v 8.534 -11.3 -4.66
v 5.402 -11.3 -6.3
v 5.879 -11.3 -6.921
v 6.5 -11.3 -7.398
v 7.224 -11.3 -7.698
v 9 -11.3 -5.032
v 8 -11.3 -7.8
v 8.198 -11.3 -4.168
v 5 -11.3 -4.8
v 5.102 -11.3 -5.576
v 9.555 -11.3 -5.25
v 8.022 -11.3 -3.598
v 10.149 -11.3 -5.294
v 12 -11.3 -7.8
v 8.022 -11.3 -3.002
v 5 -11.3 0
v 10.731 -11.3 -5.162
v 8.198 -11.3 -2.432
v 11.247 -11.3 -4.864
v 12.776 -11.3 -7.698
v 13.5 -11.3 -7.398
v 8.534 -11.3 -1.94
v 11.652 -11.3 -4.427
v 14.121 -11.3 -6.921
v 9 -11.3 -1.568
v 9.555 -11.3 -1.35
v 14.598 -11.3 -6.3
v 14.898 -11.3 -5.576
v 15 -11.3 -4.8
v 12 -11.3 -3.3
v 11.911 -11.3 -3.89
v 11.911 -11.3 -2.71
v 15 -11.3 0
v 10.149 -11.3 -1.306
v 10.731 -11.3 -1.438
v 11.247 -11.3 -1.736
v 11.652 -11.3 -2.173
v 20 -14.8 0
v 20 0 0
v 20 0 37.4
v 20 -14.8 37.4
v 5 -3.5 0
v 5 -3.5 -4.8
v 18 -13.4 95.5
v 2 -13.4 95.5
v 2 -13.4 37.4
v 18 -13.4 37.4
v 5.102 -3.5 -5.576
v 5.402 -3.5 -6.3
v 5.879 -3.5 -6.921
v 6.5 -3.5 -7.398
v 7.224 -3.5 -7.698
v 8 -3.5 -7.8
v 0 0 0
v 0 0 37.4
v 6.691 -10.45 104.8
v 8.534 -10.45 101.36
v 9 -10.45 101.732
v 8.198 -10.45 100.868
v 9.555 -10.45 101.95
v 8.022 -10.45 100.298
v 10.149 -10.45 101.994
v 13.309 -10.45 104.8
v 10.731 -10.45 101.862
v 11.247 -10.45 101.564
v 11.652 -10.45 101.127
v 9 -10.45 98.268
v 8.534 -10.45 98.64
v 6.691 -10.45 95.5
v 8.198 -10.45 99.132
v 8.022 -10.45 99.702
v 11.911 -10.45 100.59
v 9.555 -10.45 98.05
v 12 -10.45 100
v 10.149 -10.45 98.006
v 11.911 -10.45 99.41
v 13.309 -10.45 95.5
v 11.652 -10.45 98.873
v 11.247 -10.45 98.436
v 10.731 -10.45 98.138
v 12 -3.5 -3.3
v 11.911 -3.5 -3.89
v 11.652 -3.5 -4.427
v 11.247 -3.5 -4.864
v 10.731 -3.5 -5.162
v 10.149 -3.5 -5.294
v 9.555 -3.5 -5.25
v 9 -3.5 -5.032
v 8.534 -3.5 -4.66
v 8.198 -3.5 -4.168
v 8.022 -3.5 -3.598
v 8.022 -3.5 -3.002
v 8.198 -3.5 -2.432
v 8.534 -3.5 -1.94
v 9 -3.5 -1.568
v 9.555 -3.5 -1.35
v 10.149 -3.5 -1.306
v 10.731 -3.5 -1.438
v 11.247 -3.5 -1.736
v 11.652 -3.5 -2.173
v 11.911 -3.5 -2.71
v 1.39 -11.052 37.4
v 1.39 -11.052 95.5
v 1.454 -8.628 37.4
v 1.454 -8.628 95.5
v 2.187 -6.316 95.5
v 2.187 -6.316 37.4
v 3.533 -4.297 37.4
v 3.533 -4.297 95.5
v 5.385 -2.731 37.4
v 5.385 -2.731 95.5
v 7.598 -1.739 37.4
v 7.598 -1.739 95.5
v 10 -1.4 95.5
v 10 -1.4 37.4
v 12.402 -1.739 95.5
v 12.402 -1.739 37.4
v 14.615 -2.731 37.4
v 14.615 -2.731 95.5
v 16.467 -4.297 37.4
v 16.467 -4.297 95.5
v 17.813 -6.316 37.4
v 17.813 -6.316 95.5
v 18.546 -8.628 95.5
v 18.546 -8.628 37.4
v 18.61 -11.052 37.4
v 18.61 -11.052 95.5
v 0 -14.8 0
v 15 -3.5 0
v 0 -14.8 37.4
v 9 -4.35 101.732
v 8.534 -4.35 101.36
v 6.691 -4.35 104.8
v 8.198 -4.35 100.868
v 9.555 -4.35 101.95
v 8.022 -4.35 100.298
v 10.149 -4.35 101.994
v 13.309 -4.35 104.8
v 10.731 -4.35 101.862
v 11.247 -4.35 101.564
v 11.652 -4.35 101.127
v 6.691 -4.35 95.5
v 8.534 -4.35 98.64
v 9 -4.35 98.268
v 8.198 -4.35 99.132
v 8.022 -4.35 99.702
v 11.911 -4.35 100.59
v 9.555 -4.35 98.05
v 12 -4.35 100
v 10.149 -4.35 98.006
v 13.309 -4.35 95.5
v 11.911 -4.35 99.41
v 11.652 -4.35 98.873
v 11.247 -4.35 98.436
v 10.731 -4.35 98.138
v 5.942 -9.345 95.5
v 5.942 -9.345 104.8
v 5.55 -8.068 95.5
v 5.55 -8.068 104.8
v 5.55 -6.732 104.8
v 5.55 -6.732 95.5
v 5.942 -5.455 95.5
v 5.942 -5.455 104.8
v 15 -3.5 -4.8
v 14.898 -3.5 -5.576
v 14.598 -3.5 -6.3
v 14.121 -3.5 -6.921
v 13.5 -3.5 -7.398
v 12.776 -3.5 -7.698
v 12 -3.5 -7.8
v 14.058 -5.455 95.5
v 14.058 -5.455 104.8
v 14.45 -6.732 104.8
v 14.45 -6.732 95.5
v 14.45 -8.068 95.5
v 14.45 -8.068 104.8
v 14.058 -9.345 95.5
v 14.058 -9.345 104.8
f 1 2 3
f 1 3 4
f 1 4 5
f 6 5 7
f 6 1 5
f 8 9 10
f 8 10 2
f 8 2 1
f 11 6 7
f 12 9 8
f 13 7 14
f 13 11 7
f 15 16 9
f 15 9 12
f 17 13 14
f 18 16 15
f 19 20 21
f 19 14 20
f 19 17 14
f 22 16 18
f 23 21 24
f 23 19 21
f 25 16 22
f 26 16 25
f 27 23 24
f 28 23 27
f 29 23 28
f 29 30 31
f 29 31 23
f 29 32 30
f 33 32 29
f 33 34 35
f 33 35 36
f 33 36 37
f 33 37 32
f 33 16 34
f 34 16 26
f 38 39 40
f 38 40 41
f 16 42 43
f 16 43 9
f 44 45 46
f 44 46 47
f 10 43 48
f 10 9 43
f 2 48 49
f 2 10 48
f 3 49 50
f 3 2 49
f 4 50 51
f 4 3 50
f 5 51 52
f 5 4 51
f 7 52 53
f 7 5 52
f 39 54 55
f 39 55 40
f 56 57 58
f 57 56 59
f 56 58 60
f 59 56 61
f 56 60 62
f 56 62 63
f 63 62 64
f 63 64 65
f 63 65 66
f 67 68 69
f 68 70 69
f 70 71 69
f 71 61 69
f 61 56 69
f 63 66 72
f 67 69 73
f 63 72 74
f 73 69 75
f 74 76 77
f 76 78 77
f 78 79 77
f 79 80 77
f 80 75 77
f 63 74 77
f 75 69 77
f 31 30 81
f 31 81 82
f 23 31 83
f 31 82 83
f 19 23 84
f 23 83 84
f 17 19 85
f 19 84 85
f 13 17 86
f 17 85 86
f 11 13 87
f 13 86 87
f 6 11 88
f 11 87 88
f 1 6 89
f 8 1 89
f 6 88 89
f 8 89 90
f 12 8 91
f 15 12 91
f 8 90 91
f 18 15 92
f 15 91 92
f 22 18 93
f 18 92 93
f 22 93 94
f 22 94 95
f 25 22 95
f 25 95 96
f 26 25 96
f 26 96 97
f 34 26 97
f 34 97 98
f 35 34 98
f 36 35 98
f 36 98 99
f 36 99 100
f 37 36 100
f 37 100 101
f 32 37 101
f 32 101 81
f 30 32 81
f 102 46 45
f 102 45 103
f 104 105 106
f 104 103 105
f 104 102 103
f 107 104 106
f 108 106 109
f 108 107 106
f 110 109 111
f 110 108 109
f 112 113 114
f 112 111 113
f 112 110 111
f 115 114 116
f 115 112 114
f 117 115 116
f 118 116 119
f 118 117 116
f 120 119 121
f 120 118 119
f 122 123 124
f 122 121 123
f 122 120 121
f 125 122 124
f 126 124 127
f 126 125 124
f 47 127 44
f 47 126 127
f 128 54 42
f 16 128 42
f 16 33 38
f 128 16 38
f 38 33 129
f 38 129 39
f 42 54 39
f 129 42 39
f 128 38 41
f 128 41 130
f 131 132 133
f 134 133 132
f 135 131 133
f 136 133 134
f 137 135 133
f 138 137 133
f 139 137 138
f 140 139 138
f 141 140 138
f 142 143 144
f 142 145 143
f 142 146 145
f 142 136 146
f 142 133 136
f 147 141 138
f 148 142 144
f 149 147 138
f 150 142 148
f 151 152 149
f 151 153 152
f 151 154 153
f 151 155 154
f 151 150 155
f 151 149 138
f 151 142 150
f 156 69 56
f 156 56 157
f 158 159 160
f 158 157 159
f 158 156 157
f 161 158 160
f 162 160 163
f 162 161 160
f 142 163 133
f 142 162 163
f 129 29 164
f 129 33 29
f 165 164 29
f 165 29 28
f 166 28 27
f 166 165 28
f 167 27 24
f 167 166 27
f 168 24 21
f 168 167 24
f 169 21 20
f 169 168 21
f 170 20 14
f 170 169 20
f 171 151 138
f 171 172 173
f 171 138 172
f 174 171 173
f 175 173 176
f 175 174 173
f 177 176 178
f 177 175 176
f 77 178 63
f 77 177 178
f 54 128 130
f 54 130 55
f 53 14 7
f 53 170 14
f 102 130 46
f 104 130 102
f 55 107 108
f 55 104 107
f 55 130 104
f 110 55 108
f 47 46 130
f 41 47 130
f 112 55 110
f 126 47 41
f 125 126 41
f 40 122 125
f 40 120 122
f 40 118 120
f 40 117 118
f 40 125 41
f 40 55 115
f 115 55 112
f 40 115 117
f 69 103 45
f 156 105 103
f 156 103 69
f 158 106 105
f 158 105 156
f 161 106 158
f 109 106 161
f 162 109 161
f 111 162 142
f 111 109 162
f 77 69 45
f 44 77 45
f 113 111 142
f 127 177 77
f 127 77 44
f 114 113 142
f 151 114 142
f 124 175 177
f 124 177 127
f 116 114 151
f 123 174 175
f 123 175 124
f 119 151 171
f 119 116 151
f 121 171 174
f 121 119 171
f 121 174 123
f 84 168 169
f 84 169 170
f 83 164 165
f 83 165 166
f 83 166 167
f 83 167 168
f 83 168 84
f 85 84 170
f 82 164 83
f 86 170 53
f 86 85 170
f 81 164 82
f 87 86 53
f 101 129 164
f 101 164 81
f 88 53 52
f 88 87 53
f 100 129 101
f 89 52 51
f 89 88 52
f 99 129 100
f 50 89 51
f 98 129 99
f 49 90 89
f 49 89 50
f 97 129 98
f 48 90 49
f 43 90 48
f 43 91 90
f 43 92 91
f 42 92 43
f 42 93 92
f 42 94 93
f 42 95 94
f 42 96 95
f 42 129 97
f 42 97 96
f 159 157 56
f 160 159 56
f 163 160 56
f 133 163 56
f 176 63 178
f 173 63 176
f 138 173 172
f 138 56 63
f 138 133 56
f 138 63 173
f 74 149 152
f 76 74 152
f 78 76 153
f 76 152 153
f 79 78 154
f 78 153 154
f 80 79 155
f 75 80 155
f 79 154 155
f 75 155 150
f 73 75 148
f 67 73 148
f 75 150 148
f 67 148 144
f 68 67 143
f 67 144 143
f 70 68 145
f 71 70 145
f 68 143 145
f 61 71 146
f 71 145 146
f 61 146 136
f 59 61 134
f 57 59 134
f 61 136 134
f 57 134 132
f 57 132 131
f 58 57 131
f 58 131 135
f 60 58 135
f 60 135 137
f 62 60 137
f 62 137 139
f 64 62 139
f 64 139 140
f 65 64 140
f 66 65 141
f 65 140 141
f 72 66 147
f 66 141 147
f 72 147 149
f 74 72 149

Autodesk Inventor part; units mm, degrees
ref_plane "YZ Plane" through (0, 0, 0) normal (1, 0, 0) x (0, 1, 0)
ref_plane "XZ Plane" through (0, 0, 0) normal (0, 1, 0) x (-1, 0, 0)
ref_plane "XY Plane" through (0, 0, 0) normal (0, 0, 1) x (1, 0, 0)
sketch "Sketch1" plane through (0, 0, 0) normal (0, 0, 1) x (1, 0, 0)
  line L0 (0, 0) -> (20, 0)
  line L1 (20, 0) -> (20, -14.8)
  line L2 (20, -14.8) -> (0, -14.8)
  line L3 (0, -14.8) -> (0, 0)
  dimension "d0" = 20
  dimension "d1" = 14.8
extrude "Extrusion1" add sketch "Sketch1" along normal blind 37.4
sketch "Sketch2" plane through (0, 0, 37.4) normal (0, 0, 1) x (1, 0, 0)
  line L0 (0, 0) -> (0, -14.8) projected
  line L1 (20, 0) -> (0, 0) projected
  line L2 (2, -13.4) -> (18, -13.4)
  arc A0 (18, -13.4) -> (2, -13.4) centre (10, -10.0667) ccw
  point P0 (10, -7.4)
  point P1 (10, -13.4)
extrude "Extrusion2" add sketch "Sketch2" along normal blind 58.1
sketch "Sketch3" plane through (0, 0, 95.5) normal (0, 0, 1) x (1, 0, 0)
  arc A0 (18, -13.4) -> (2, -13.4) centre (10, -10.0667) ccw projected
  line L0 (2, -13.4) -> (18, -13.4) projected
  line L1 (2, -13.4) -> (2, -13.4)
  line L2 (2, -13.4) -> (2, -13.4) construction
  line L3 (10, -13.4) -> (22, -13.4) construction
  line L4 (18, -13.4) -> (2, -13.4) projected
  line L5 (0, -14.8) -> (20, -14.8) projected
  line L6 (6.6913, -4.35) -> (13.3087, -4.35)
  line L7 (6.6913, -10.45) -> (13.3087, -10.45)
  arc A1 (6.6913, -4.35) -> (6.6913, -10.45) centre (10, -7.4) ccw
  arc A2 (13.3087, -10.45) -> (13.3087, -4.35) centre (10, -7.4) ccw
  point P0 (0, 0)
  dimension "d12" = 90
extrude "Extrusion3" add sketch "Sketch3" along normal blind 9.3 contours L6 A2 L7 A1
sketch "Sketch4" plane through (6.6913, -4.35, 95.5) normal (0, 1, 0) x (1, 0, 0)
  circle A0 centre (3.3087, -4.5) radius 2
  line L0 (-5.358, 0) -> (11.9754, 0) projected
  point P0 (-6.6913, 95.5)
  point P1 (11.3087, 0)
  point P2 (-4.6913, 0)
  dimension "d21" = 4
  dimension "d22" = 4.5
extrude "Extrusion4" cut sketch "Sketch4" against normal through all
sketch "Sketch5" plane through (0, 0, 0) normal (0, 0, -1) x (-1, 0, 0)
  line L0 (-15, -3.5) -> (-5, -3.5)
  line L1 (-5, -3.5) -> (-5, -11.3)
  line L2 (-5, -11.3) -> (-15, -11.3)
  line L3 (-15, -11.3) -> (-15, -3.5)
  line L4 (-15, -3.5) -> (-5, -11.3) construction
  line L5 (-5, -3.5) -> (-15, -11.3) construction
  line L6 (-20, 0) -> (0, 0) projected
  line L7 (0, -14.8) -> (-20, -14.8) projected
  line L8 (0, 0) -> (0, -14.8) projected
  line L9 (-20, 0) -> (0, 0) projected
  line L10 (-20, -14.8) -> (-20, 0) projected
  point P0 (-10, -7.4)
  point P1 (0, -7.4)
  point P2 (-10, -7.4)
  dimension "d25" = 7.8
  dimension "d26" = 10
  dimension "d27" = 10
extrude "Extrusion5" add sketch "Sketch5" along normal blind 7.8 contours L0 L1 L2 L3
sketch "Sketch6" plane through (5, -3.5, 0) normal (0, 1, 0) x (1, 0, 0)
  circle A0 centre (5, 3.3) radius 2
  line L0 (0, 7.8) -> (10, 7.8) projected
  line L1 (0, 0) -> (0, 7.8) projected
  point P0 (-5, 0)
  point P1 (5, 7.8)
  dimension "d30" = 4
  dimension "d31" = 4.5
  dimension "d32" = 5
extrude "Extrusion6" cut sketch "Sketch6" against normal through all
fillet "Fillet1" radius 3 2 edges at (15, -7.4, -7.8) (5, -7.4, -7.8)
properties part number "actuator"
